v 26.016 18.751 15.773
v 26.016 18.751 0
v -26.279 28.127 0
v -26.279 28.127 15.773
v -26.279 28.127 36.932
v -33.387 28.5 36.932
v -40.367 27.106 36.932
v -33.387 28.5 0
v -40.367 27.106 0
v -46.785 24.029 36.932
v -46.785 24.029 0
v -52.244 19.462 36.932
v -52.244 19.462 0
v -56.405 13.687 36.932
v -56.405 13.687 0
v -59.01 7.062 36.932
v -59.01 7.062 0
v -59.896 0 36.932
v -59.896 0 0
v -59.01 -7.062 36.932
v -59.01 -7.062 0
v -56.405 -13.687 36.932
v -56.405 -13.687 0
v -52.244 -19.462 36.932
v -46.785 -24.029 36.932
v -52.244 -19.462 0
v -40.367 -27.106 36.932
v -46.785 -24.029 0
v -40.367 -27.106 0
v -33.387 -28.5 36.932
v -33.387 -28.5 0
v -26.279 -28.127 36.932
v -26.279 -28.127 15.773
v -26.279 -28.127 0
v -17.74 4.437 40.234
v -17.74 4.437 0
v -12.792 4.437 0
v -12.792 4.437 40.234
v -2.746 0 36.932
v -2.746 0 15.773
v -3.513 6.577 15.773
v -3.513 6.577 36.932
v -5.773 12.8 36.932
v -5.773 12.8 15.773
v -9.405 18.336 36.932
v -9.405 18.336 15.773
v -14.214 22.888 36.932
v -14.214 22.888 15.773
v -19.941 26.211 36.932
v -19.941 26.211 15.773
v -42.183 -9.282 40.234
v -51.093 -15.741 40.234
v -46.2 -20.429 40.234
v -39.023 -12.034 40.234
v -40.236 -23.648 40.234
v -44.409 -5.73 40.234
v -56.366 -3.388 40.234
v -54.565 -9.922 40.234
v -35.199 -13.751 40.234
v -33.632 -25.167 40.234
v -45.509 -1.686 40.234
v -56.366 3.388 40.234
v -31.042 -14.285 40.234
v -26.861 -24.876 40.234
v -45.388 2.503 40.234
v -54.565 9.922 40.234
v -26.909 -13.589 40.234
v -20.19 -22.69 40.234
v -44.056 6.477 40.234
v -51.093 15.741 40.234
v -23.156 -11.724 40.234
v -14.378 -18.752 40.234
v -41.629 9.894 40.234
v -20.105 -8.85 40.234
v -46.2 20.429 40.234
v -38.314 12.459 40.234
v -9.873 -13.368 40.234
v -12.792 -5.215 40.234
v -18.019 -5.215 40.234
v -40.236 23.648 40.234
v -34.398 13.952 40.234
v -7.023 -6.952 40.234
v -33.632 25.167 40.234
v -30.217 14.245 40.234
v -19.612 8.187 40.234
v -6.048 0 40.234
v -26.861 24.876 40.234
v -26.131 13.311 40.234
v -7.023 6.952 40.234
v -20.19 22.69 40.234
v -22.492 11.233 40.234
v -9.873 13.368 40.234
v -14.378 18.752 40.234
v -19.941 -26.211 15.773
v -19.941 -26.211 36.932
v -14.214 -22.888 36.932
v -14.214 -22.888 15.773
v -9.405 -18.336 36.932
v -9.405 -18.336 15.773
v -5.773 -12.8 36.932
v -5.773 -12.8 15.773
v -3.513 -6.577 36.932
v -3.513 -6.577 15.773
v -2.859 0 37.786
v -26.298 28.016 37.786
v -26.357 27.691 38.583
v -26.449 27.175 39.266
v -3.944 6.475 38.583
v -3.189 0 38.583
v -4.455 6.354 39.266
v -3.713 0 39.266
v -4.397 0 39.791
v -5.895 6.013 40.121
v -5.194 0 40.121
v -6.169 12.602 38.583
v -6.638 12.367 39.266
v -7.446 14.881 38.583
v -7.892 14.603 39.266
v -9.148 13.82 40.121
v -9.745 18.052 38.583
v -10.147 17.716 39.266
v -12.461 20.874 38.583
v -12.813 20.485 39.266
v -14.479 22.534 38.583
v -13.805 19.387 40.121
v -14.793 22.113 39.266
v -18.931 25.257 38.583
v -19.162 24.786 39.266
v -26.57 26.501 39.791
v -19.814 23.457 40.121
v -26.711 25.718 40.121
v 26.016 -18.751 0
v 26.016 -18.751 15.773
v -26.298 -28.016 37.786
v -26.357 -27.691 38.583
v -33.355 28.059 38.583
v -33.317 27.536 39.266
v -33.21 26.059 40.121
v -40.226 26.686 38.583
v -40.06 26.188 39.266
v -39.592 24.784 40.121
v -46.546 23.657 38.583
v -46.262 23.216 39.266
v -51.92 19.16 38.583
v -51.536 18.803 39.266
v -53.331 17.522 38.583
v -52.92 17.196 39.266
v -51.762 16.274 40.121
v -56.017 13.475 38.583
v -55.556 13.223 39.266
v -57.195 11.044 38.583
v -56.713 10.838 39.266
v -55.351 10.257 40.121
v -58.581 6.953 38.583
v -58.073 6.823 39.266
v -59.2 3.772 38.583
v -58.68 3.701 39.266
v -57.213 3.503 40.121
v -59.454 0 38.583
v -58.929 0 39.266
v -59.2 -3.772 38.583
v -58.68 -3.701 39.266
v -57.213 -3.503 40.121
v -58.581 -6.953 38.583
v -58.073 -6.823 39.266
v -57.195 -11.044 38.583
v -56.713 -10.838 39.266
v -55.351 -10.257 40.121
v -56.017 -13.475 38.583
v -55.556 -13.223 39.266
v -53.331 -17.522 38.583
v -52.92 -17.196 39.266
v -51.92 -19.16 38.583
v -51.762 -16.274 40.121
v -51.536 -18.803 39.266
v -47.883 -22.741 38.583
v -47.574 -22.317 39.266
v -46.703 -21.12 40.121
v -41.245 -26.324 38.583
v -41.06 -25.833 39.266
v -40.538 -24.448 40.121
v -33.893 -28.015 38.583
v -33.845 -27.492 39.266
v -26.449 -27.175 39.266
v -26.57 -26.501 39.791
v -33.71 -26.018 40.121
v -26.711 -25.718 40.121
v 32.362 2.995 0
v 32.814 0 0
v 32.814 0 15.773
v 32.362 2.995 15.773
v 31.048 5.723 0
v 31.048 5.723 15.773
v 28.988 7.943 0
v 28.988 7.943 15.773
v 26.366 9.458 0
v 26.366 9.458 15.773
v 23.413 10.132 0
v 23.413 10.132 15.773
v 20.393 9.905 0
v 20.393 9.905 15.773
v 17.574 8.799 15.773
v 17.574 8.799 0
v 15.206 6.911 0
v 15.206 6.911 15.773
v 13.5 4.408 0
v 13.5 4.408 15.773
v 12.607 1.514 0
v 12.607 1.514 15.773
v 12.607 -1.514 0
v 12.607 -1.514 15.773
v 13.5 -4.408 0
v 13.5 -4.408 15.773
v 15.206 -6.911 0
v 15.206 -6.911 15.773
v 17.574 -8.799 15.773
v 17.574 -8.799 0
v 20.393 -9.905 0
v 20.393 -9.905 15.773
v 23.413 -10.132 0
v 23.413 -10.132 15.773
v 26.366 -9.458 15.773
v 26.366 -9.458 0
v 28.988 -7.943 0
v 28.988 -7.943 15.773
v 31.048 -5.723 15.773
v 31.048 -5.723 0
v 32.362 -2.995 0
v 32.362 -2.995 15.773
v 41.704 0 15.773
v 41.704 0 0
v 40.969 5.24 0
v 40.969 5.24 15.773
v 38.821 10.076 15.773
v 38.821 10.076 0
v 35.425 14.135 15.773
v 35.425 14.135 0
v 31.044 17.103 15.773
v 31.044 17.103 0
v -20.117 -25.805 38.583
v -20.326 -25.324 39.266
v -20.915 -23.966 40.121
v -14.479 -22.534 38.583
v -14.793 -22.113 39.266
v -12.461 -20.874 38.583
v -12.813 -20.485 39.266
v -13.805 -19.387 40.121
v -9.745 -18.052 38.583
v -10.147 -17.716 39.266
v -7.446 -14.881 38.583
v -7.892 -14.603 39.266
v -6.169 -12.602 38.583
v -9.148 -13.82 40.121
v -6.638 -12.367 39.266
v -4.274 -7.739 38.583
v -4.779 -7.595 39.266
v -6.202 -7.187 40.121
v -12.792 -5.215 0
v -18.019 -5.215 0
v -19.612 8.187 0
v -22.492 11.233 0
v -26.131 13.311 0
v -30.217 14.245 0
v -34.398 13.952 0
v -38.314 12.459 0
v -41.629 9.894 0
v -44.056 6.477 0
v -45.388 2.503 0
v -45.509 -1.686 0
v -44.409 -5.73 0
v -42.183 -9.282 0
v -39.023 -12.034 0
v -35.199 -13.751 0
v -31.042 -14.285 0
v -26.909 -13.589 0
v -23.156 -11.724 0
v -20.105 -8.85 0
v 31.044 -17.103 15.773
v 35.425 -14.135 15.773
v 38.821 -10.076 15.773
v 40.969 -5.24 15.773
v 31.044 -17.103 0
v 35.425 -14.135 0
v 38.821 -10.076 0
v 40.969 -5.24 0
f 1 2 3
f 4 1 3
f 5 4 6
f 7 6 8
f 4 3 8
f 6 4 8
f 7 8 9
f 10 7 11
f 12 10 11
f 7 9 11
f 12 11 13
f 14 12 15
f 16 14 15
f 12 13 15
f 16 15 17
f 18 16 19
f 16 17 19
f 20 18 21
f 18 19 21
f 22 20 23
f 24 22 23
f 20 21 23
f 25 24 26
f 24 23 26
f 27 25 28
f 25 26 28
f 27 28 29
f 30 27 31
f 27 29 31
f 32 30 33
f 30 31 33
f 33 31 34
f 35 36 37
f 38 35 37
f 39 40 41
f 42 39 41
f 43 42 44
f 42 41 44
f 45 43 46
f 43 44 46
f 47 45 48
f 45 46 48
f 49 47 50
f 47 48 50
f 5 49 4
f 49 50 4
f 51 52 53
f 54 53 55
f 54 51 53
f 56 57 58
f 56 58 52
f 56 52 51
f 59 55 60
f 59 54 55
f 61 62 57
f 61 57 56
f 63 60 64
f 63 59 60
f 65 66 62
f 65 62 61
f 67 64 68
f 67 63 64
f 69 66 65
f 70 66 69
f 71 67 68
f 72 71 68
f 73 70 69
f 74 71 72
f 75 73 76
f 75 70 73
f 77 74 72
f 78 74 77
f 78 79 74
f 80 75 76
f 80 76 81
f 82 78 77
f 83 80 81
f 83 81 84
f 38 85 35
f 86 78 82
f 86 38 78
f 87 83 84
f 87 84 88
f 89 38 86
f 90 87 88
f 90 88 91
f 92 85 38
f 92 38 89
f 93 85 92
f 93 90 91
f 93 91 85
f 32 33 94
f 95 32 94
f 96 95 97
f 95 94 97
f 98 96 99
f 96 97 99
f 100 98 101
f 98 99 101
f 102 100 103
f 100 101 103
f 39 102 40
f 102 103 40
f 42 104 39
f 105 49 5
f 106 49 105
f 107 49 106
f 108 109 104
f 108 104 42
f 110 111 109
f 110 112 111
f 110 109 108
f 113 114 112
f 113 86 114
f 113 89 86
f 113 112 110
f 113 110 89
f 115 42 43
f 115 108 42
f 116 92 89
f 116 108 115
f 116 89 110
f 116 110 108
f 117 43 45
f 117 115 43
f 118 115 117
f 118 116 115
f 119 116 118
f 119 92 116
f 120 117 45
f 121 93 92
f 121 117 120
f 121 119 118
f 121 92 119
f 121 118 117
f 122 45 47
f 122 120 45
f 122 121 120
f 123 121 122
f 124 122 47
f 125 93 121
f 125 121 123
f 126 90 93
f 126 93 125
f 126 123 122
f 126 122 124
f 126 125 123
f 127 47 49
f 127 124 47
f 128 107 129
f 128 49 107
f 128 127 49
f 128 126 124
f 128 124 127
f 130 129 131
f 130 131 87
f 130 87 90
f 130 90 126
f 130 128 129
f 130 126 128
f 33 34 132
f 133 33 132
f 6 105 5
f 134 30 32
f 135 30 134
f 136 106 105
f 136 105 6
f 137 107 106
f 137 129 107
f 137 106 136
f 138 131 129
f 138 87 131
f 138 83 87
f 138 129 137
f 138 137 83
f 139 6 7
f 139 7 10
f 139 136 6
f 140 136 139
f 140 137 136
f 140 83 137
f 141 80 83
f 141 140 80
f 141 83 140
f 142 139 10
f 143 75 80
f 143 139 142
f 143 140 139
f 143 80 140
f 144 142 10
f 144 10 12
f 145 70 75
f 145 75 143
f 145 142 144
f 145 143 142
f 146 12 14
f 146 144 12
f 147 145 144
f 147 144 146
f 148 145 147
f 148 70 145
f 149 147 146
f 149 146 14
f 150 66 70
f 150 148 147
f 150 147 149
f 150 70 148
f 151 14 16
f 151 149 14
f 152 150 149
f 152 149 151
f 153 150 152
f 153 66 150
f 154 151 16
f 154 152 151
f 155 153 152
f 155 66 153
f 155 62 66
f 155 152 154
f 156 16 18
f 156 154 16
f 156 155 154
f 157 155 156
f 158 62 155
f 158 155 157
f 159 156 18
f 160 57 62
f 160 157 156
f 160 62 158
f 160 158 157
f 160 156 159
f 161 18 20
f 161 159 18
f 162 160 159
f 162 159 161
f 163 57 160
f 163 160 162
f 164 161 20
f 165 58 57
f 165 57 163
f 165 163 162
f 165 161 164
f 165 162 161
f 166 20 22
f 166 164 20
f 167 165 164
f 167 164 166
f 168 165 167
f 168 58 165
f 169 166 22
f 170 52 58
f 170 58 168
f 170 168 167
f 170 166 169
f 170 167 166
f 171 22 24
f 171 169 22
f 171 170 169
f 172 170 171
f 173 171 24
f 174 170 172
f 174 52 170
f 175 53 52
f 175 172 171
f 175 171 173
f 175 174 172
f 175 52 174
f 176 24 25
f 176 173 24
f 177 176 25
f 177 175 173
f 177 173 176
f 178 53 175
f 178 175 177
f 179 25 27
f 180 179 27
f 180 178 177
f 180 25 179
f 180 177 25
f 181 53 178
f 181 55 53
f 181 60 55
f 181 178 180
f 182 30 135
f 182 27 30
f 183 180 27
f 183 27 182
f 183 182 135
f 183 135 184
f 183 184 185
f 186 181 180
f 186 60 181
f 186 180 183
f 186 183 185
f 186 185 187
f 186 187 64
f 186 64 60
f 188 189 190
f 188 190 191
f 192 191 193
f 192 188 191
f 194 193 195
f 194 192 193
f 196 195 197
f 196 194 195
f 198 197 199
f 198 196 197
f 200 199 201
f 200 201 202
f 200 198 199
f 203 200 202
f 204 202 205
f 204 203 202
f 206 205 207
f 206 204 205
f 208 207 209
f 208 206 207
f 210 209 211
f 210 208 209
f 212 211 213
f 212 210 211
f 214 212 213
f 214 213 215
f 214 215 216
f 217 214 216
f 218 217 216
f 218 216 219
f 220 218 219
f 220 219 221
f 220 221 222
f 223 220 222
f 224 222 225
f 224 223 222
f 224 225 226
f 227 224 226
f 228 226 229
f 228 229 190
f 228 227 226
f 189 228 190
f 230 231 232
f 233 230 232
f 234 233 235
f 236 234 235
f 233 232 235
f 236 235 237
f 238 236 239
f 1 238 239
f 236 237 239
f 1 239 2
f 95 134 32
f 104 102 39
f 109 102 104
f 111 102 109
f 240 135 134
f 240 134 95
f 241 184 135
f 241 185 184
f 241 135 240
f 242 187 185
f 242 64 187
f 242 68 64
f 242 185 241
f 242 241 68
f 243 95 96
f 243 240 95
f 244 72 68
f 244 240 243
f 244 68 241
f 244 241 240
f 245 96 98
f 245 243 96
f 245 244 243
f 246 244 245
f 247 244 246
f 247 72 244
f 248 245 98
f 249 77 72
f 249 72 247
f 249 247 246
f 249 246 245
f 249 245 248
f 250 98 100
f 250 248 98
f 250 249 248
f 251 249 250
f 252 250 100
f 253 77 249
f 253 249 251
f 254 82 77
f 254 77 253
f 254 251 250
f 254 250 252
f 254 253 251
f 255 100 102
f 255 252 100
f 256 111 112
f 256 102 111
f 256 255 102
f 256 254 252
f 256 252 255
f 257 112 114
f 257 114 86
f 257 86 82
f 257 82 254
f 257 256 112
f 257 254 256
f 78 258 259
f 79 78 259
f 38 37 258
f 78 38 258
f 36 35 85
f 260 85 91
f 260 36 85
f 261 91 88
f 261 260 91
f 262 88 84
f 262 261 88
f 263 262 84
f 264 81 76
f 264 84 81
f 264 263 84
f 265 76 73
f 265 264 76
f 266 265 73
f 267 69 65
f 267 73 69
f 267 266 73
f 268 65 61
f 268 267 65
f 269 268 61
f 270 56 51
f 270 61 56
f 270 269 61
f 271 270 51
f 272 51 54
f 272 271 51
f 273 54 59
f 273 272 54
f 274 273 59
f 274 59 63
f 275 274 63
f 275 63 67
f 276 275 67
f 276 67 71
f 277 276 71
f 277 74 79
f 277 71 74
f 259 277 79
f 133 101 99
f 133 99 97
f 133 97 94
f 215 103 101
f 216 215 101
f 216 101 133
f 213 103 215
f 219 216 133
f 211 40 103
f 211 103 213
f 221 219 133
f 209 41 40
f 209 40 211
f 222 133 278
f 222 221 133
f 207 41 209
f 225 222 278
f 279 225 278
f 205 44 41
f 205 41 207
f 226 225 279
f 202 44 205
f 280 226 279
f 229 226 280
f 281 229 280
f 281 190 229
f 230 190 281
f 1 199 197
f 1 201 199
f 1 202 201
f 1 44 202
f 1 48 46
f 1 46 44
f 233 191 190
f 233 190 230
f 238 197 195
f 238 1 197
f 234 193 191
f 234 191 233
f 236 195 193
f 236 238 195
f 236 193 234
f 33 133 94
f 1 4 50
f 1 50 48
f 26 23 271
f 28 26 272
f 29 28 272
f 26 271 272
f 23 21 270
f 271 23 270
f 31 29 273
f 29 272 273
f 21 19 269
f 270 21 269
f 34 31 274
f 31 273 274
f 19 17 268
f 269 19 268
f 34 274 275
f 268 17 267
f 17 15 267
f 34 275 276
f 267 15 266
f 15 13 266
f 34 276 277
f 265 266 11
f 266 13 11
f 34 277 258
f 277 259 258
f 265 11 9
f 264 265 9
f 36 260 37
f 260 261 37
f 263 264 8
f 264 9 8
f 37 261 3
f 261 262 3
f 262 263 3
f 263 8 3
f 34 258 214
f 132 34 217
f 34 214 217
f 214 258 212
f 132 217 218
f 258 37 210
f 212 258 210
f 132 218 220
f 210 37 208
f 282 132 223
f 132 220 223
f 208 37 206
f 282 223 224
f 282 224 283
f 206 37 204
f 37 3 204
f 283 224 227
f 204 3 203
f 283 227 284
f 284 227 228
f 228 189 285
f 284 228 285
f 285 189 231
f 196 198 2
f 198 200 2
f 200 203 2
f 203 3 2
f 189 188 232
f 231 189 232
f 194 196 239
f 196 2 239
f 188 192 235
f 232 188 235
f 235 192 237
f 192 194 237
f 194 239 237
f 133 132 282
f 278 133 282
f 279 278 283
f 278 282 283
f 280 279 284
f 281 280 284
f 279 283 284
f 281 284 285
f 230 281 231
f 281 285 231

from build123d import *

# Parameters (mm, degrees)
F0_R     = 10.16
F1_DEPTH = 15.7734
F2_DEPTH = 40.2336
F3_DEPTH = 40.2346
F4_DEPTH = 25.4
F5_R     = 3.302


with BuildPart() as f1:
    # F0 (on Top) → F1 (new body)
    with BuildSketch(Plane.XY):
        with BuildLine():
            ThreePointArc((-26.278611, 28.126541), (-9.405233, 18.336262), (-2.746258, 0))
            ThreePointArc((-2.746258, 0), (-9.405233, -18.336262), (-26.278611, -28.126541))
            Line((-26.278611, -28.126541), (26.015507, -18.751028))
            ThreePointArc((26.015507, -18.751028), (3.603742, 0), (26.015507, 18.751028))
            Line((26.015507, 18.751028), (-26.278611, 28.126541))
        make_face()
        with BuildLine():
            ThreePointArc((-26.278611, -28.126541), (-9.405233, -18.336262), (-2.746258, 0))
            ThreePointArc((-2.746258, 0), (-9.405233, 18.336262), (-26.278611, 28.126541))
            ThreePointArc((-26.278611, 28.126541), (-59.896258, 0), (-26.278611, -28.126541))
        make_face()
        with BuildLine():
            ThreePointArc((-18.019436, -5.214805), (-45.602785, 0.413106), (-17.740244, 4.437195))
            Line((-17.740244, 4.437195), (-12.791958, 4.437195))
            Line((-12.791958, 4.437195), (-12.791958, -5.214805))
            Line((-12.791958, -5.214805), (-18.019436, -5.214805))
        make_face(mode=Mode.SUBTRACT)
        with BuildLine():
            ThreePointArc((-18.019436, -5.214805), (-17.28234, -2.653571), (-17.033758, 0))
            ThreePointArc((-17.033758, 0), (-17.211485, 2.246543), (-17.740244, 4.437195))
            Line((-17.740244, 4.437195), (-31.321258, 4.437195))
            Line((-31.321258, 4.437195), (-31.321258, -5.214805))
            Line((-31.321258, -5.214805), (-18.019436, -5.214805))
        make_face()
        with Locations((22.653742, 0)):
            Circle(F0_R)
        with BuildLine():
            Line((-31.321258, 4.437195), (-17.740244, 4.437195))
            ThreePointArc((-17.740244, 4.437195), (-45.602785, 0.413106), (-18.019436, -5.214805))
            Line((-18.019436, -5.214805), (-31.321258, -5.214805))
            Line((-31.321258, -5.214805), (-31.321258, 4.437195))
        make_face()
        with BuildLine():
            ThreePointArc((-17.740244, 4.437195), (-17.211485, 2.246543), (-17.033758, 0))
            ThreePointArc((-17.033758, 0), (-17.28234, -2.653571), (-18.019436, -5.214805))
            Line((-18.019436, -5.214805), (-12.791958, -5.214805))
            Line((-12.791958, -5.214805), (-12.791958, 4.437195))
            Line((-12.791958, 4.437195), (-17.740244, 4.437195))
        make_face()
        with BuildLine():
            ThreePointArc((41.703742, 0), (37.264425, 12.224174), (26.015507, 18.751028))
            ThreePointArc((26.015507, 18.751028), (3.603742, 0), (26.015507, -18.751028))
            ThreePointArc((26.015507, -18.751028), (37.264425, -12.224174), (41.703742, 0))
        make_face()
        with Locations((22.653742, 0)):
            Circle(F0_R, mode=Mode.SUBTRACT)
    extrude(amount=F1_DEPTH)

    # F0 (on Top) → F2 (join)
    with BuildSketch(Plane.XY):
        with BuildLine():
            ThreePointArc((-26.278611, -28.126541), (-9.405233, -18.336262), (-2.746258, 0))
            ThreePointArc((-2.746258, 0), (-9.405233, 18.336262), (-26.278611, 28.126541))
            ThreePointArc((-26.278611, 28.126541), (-59.896258, 0), (-26.278611, -28.126541))
        make_face()
        with BuildLine():
            ThreePointArc((-18.019436, -5.214805), (-45.602785, 0.413106), (-17.740244, 4.437195))
            Line((-17.740244, 4.437195), (-12.791958, 4.437195))
            Line((-12.791958, 4.437195), (-12.791958, -5.214805))
            Line((-12.791958, -5.214805), (-18.019436, -5.214805))
        make_face(mode=Mode.SUBTRACT)
    extrude(amount=F2_DEPTH)

    # F0 (on Top) → F3 (cut, through all)
    with BuildSketch(Plane.XY):
        with BuildLine():
            ThreePointArc((-18.019436, -5.214805), (-17.28234, -2.653571), (-17.033758, 0))
            ThreePointArc((-17.033758, 0), (-17.211485, 2.246543), (-17.740244, 4.437195))
            Line((-17.740244, 4.437195), (-31.321258, 4.437195))
            Line((-31.321258, 4.437195), (-31.321258, -5.214805))
            Line((-31.321258, -5.214805), (-18.019436, -5.214805))
        make_face()
        with BuildLine():
            ThreePointArc((-17.740244, 4.437195), (-17.211485, 2.246543), (-17.033758, 0))
            ThreePointArc((-17.033758, 0), (-17.28234, -2.653571), (-18.019436, -5.214805))
            Line((-18.019436, -5.214805), (-12.791958, -5.214805))
            Line((-12.791958, -5.214805), (-12.791958, 4.437195))
            Line((-12.791958, 4.437195), (-17.740244, 4.437195))
        make_face()
        with BuildLine():
            Line((-31.321258, 4.437195), (-17.740244, 4.437195))
            ThreePointArc((-17.740244, 4.437195), (-45.602785, 0.413106), (-18.019436, -5.214805))
            Line((-18.019436, -5.214805), (-31.321258, -5.214805))
            Line((-31.321258, -5.214805), (-31.321258, 4.437195))
        make_face()
    extrude(amount=F3_DEPTH, mode=Mode.SUBTRACT)

    # F0 (on Top) → F4 (cut)
    with BuildSketch(Plane.XY):
        with Locations((22.653742, 0)):
            Circle(F0_R)
    extrude(amount=F4_DEPTH, mode=Mode.SUBTRACT)

    # F5
    f5_edges = [f1.edges().sort_by_distance(p)[0] for p in [
        (-36.363905, 28.126541, 40.2336),
    ]]
    fillet(f5_edges, radius=F5_R)


solid = f1.part
